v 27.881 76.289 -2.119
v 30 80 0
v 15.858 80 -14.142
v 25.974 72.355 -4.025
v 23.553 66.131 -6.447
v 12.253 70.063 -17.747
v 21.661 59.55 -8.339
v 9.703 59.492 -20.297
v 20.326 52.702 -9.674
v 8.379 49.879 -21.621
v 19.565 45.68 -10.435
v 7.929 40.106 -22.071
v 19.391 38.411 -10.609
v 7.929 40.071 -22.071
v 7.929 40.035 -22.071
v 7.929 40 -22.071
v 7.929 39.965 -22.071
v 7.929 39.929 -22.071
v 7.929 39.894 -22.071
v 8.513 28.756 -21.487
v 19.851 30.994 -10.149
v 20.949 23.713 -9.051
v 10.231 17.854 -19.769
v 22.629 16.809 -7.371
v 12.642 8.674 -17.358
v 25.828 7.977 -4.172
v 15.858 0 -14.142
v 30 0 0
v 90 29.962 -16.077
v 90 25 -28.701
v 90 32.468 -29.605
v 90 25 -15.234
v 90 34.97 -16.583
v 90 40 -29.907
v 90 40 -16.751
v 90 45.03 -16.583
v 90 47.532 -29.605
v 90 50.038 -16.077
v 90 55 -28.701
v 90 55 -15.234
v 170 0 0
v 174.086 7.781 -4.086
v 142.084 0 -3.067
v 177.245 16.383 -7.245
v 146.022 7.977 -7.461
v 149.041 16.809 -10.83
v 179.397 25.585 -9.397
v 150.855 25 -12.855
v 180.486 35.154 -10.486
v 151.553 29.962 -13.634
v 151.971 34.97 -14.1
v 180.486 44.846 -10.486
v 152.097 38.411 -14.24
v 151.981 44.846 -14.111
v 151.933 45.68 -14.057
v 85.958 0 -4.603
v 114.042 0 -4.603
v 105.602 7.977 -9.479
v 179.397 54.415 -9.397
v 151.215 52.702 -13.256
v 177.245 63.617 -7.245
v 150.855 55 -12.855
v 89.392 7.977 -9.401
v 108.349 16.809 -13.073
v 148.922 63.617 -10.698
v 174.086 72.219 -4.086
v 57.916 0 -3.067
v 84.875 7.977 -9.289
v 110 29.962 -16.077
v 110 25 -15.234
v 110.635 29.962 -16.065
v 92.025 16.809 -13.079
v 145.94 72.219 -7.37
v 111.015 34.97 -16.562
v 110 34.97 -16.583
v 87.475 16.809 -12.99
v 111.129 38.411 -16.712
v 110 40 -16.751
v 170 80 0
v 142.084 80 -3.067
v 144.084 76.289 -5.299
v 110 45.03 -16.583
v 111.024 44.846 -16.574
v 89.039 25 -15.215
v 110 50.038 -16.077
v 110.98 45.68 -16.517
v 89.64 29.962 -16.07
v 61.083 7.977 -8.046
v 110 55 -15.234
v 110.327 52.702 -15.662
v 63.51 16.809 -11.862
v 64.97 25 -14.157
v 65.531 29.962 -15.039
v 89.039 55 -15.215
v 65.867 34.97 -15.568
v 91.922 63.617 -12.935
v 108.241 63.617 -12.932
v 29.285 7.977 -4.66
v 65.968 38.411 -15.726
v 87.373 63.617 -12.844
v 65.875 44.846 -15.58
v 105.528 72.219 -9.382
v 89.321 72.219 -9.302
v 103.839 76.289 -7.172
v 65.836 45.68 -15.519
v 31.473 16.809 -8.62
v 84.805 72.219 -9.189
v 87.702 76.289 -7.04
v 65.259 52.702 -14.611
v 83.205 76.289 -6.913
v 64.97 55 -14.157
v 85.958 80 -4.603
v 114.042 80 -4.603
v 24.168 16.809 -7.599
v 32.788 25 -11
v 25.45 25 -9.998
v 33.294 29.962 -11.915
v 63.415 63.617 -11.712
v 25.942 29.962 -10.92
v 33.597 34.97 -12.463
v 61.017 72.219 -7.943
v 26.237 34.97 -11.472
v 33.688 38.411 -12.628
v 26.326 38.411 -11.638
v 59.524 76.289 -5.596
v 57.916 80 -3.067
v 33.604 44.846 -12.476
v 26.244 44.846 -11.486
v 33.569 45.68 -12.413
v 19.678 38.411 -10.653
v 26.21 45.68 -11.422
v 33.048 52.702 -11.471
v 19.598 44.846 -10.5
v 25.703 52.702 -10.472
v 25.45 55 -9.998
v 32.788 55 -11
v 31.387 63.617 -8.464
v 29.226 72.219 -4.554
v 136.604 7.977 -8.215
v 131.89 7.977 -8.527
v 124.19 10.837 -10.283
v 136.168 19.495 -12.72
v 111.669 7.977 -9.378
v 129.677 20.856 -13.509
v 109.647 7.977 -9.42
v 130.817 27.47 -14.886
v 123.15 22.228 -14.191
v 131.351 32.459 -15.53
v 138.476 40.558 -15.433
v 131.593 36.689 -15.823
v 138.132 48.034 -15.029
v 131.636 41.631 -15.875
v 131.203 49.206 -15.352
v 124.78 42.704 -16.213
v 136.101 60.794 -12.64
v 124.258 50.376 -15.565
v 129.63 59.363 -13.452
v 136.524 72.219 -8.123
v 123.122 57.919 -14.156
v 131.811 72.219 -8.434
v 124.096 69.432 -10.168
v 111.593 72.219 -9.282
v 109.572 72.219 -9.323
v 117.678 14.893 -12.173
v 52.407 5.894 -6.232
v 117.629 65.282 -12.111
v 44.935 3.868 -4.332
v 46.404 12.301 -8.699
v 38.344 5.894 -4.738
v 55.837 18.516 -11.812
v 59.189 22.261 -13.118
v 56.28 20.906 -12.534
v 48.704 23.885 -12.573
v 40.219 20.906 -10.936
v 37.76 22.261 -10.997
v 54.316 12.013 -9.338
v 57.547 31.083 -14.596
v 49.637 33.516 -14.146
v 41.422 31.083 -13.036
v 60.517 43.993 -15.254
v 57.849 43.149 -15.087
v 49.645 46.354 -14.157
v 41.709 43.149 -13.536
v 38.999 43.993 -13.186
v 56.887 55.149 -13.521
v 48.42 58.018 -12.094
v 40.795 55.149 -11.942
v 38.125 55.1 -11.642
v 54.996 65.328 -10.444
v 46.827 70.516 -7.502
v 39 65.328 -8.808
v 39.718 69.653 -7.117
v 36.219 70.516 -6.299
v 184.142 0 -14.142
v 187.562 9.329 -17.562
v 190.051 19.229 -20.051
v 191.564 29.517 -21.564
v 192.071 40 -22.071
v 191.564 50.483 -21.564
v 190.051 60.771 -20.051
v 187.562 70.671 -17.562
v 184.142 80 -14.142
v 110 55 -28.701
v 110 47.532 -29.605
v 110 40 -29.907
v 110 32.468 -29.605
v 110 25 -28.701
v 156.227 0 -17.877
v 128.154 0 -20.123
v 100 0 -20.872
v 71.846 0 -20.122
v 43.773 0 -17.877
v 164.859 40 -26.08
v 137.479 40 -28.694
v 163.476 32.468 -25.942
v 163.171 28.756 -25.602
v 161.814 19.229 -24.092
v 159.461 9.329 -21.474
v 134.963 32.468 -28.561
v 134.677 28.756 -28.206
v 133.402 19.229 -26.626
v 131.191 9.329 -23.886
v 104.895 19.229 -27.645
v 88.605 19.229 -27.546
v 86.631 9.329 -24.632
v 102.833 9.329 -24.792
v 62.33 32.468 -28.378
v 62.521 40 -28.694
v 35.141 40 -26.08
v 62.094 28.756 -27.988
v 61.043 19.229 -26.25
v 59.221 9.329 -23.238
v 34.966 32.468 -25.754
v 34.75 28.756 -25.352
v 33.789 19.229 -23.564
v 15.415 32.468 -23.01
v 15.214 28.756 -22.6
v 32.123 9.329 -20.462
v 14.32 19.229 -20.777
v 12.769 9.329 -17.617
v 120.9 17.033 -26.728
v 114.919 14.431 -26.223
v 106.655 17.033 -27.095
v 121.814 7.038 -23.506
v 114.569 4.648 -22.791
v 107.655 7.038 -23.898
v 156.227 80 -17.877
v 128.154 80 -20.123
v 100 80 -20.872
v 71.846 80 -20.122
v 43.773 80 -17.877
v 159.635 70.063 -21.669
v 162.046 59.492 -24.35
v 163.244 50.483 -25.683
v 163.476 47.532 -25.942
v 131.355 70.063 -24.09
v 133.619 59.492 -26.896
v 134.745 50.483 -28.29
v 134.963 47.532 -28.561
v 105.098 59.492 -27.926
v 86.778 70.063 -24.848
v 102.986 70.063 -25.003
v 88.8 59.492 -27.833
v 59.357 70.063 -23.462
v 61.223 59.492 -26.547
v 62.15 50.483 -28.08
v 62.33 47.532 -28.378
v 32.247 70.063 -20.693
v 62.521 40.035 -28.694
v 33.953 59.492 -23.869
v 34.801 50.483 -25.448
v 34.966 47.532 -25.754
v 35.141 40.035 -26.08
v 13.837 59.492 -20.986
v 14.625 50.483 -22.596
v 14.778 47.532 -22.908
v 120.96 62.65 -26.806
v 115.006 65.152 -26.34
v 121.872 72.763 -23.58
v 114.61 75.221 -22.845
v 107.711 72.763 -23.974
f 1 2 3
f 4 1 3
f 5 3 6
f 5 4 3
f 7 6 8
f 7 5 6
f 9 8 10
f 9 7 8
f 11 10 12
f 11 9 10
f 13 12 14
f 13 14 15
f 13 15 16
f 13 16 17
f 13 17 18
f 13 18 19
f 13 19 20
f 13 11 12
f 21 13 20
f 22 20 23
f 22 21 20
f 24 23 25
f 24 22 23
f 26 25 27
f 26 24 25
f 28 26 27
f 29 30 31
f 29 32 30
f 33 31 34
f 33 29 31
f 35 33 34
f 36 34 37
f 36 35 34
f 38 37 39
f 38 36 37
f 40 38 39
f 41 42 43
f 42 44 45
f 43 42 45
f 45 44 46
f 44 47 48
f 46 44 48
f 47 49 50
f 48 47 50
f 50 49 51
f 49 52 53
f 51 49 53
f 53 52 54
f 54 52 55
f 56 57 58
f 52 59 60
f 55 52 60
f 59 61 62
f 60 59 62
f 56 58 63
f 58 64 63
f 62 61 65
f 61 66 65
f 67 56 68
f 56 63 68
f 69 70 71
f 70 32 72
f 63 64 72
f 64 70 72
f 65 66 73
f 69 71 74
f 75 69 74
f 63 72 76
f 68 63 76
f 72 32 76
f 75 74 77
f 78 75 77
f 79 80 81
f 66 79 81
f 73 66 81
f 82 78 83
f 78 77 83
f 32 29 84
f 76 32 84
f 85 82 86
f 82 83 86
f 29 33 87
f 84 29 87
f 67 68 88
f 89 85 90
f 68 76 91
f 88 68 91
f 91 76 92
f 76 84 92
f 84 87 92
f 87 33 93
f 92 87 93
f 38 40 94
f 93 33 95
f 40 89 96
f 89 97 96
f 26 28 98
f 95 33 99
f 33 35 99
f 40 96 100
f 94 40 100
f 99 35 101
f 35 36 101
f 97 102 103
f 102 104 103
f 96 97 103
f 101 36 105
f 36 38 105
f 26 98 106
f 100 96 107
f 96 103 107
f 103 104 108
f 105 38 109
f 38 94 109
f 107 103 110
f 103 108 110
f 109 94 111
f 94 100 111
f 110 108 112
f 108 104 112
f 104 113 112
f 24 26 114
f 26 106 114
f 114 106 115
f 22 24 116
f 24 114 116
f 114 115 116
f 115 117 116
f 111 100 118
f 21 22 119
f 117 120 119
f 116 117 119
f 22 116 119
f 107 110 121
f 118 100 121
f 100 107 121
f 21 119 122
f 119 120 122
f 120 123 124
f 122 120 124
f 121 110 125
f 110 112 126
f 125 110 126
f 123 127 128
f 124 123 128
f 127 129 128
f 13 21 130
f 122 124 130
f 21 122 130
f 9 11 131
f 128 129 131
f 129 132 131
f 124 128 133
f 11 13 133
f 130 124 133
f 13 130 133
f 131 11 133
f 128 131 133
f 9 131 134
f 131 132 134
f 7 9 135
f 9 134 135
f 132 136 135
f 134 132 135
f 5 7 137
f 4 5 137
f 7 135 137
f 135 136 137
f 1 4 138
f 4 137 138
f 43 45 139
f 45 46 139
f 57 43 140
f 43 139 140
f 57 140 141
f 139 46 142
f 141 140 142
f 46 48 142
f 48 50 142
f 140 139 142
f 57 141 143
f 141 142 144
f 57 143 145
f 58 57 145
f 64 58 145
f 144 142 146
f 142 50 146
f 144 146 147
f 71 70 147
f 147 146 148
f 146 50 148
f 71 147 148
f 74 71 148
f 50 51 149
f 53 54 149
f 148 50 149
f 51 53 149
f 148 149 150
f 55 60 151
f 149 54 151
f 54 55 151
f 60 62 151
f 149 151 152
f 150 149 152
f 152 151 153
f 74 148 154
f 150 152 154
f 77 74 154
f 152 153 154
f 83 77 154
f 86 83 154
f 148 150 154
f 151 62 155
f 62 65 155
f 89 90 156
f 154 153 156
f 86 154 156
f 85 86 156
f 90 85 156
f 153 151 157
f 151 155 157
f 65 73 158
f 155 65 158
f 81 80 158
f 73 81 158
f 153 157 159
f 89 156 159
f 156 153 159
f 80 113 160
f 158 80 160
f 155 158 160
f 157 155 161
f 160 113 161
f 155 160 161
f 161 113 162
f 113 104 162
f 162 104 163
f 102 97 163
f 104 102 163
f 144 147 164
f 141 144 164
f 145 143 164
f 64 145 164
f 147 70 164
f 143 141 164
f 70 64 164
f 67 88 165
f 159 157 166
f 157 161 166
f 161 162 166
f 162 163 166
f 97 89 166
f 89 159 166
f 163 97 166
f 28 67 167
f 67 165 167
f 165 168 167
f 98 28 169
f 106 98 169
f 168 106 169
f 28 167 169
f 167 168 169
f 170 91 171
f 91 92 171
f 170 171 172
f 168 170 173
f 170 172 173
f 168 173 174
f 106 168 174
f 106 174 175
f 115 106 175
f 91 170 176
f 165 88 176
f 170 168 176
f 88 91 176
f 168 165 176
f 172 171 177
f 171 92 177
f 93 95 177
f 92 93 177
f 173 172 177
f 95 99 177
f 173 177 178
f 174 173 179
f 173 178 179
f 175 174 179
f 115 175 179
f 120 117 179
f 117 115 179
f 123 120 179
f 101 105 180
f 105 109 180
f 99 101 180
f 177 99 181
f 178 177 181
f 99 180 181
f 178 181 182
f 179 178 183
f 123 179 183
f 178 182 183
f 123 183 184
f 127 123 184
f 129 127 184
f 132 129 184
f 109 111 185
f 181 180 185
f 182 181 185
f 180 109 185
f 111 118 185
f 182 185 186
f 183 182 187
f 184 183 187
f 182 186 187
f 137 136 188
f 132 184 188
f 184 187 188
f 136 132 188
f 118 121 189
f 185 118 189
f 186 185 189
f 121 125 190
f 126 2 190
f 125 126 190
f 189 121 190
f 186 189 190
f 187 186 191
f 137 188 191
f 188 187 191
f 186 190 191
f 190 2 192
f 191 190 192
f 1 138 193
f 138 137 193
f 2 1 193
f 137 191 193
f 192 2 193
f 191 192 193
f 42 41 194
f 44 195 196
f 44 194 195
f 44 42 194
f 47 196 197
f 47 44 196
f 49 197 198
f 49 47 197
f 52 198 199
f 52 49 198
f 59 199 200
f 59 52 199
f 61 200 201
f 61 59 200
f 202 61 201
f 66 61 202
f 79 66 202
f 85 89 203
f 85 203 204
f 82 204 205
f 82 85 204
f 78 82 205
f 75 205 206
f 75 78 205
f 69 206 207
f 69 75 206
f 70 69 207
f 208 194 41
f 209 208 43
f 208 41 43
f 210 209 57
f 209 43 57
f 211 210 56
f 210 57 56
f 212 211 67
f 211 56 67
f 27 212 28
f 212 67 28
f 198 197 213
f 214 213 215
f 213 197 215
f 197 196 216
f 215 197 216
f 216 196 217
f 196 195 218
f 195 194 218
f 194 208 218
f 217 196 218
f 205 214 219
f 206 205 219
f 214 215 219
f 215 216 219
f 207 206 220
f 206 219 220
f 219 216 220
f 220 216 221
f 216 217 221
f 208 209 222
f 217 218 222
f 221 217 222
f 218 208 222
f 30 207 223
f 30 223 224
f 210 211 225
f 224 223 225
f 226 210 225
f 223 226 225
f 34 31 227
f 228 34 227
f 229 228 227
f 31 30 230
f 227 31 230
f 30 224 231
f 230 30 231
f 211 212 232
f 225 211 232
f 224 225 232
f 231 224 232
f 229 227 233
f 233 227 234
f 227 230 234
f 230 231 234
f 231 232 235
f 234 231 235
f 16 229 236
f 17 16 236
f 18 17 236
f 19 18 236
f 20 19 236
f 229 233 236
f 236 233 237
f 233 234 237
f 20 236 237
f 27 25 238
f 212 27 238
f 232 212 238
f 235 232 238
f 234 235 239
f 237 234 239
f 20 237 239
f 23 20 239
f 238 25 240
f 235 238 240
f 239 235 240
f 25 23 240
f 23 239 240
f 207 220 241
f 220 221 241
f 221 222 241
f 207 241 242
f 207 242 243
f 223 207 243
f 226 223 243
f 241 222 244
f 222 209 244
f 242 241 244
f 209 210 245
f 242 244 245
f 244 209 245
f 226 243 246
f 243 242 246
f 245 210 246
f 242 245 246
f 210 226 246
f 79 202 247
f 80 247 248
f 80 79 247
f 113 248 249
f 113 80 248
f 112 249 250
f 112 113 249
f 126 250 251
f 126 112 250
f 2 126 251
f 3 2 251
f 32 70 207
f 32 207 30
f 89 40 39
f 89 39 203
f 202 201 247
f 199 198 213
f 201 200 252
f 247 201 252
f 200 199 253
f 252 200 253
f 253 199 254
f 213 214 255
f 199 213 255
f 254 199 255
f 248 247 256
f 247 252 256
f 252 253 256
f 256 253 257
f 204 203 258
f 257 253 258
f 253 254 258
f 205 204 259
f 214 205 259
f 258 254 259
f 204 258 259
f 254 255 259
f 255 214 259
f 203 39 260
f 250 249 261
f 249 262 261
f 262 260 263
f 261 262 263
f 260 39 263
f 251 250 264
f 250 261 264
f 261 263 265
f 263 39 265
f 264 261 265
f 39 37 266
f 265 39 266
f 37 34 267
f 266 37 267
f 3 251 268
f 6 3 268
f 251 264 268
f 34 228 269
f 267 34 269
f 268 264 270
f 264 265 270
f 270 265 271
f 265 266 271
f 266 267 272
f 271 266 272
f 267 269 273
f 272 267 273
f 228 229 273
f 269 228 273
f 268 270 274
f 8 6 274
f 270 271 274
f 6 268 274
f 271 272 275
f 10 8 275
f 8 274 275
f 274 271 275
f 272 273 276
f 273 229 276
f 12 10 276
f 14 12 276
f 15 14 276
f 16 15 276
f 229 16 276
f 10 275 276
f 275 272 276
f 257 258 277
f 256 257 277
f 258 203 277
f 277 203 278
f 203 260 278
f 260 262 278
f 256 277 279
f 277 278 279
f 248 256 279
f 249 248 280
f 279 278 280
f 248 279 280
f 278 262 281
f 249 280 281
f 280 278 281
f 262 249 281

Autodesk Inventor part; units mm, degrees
ref_plane "YZ Plane" through (0, 0, 0) normal (1, 0, 0) x (0, 1, 0)
ref_plane "XZ Plane" through (0, 0, 0) normal (0, 1, 0) x (-1, 0, 0)
ref_plane "XY Plane" through (0, 0, 0) normal (0, 0, 1) x (1, 0, 0)
sketch "Эскиз1" plane through (0, 0, 0) normal (0, 1, 0) x (-1, 0, 0)
  line L0 (0, 0) -> (-200, 0)
  line L1 (-200, 0) -> (-200, -30)
  line L2 (-200, -30) -> (0, -30)
  line L3 (0, -30) -> (0, 0)
  dimension "d0" = 200
  dimension "d1" = 30
extrude "Выдавливание1" add sketch "Эскиз1" along normal blind 80
chamfer "Фаска1" distance 30 angle 45 2 edges at (0, 40, 0) (200, 40, 0)
sketch "Эскиз2" plane through (30, 0, 0) normal (0, 0, 1) x (1, 0, 0)
  line L0 (60, 55) -> (80, 55)
  line L1 (80, 55) -> (80, 25)
  line L2 (80, 25) -> (60, 25)
  line L3 (60, 25) -> (60, 55)
  line L4 (0, 0) -> (0, 80) projected
  line L5 (0, 80) -> (140, 80) projected
  point P0 (-30, 0)
  point P1 (60, 40)
  point P2 (0, 40)
  point P3 (70, 55)
  point P4 (70, 80)
  dimension "d7" = 20
  dimension "d8" = 30
extrude "Выдавливание2" cut sketch "Эскиз2" against normal through all
sketch "Эскиз3" plane through (0, 80, 0) normal (0, 1, 0) x (1, 0, 0)
  line L0 (200, 30) -> (170, 0) projected
  line L1 (200, 30) -> (0, 30) projected
  line L2 (30, 0) -> (0, 30) projected
  line L3 (30, 0) -> (170, 0) projected
  line L4 (30, 0) -> (0, 30) projected
  line L5 (15, 15) -> (7.9289, 22.0711)
  arc A0 (192.0711, 22.0711) -> (7.9289, 22.0711) centre (100, -508.5309) ccw
  line L6 (200, 30) -> (0, 30) projected
  line L7 (30, 0) -> (170, 0) projected
  arc A1 (170, 0) -> (30, 0) centre (100, -508.5309) ccw
  point P0 (0, 0)
  point P1 (100, 0)
  point P2 (100, 0)
  dimension "d11" = 10
extrude "Выдавливание3" cut sketch "Эскиз3" against normal through all contours L0 A0 L1 | A0 L2 L1 | L3 A1
sketch "Эскиз4" plane through (192.0711, 0, -22.0711) normal (0.7071068, 0, 0.7071068) x (0.7071068, 0, -0.7071068)
  line L0 (0, 0) -> (0, 80) projected
  line L1 (0, 80) -> (-31.2132, 80) projected
  line L2 (-31.2132, 80) -> (-31.2132, 0) projected
  line L3 (-31.2132, 0) -> (0, 0) projected
  line L4 (0, 80) -> (-130.2082, 80) projected
  arc A0 (-11.2132, 0) -> (-11.2132, 80) centre (-76.9511, 40) ccw
  arc A1 (-31.2132, 0) -> (-31.2132, 80) centre (-76.9511, 40) ccw
  line L5 (-31.2132, 0) -> (0, 0) projected
  line L6 (0, 0) -> (0, 80) projected
  line L7 (-31.2132, 80) -> (-11.2132, 80)
  line L8 (-31.2132, 0) -> (-11.2132, 0)
  point P0 (-151.4214, 0)
  point P1 (-31.2132, 40)
  dimension "d14" = 20
sketch3d "3D эскиз1"
  arc A0 (192.0711, 80, -22.0711) -> (7.9289, 80, -22.0711) centre (100, 80, 508.5309) ccw
sweep "Сдвиг1" cut profiles "Эскиз4" path "3D эскиз1" contours L3 A0 L0 | A0 L1 L0 | L2 A1
properties part number "dou_short_square" material "Красное дерево"
